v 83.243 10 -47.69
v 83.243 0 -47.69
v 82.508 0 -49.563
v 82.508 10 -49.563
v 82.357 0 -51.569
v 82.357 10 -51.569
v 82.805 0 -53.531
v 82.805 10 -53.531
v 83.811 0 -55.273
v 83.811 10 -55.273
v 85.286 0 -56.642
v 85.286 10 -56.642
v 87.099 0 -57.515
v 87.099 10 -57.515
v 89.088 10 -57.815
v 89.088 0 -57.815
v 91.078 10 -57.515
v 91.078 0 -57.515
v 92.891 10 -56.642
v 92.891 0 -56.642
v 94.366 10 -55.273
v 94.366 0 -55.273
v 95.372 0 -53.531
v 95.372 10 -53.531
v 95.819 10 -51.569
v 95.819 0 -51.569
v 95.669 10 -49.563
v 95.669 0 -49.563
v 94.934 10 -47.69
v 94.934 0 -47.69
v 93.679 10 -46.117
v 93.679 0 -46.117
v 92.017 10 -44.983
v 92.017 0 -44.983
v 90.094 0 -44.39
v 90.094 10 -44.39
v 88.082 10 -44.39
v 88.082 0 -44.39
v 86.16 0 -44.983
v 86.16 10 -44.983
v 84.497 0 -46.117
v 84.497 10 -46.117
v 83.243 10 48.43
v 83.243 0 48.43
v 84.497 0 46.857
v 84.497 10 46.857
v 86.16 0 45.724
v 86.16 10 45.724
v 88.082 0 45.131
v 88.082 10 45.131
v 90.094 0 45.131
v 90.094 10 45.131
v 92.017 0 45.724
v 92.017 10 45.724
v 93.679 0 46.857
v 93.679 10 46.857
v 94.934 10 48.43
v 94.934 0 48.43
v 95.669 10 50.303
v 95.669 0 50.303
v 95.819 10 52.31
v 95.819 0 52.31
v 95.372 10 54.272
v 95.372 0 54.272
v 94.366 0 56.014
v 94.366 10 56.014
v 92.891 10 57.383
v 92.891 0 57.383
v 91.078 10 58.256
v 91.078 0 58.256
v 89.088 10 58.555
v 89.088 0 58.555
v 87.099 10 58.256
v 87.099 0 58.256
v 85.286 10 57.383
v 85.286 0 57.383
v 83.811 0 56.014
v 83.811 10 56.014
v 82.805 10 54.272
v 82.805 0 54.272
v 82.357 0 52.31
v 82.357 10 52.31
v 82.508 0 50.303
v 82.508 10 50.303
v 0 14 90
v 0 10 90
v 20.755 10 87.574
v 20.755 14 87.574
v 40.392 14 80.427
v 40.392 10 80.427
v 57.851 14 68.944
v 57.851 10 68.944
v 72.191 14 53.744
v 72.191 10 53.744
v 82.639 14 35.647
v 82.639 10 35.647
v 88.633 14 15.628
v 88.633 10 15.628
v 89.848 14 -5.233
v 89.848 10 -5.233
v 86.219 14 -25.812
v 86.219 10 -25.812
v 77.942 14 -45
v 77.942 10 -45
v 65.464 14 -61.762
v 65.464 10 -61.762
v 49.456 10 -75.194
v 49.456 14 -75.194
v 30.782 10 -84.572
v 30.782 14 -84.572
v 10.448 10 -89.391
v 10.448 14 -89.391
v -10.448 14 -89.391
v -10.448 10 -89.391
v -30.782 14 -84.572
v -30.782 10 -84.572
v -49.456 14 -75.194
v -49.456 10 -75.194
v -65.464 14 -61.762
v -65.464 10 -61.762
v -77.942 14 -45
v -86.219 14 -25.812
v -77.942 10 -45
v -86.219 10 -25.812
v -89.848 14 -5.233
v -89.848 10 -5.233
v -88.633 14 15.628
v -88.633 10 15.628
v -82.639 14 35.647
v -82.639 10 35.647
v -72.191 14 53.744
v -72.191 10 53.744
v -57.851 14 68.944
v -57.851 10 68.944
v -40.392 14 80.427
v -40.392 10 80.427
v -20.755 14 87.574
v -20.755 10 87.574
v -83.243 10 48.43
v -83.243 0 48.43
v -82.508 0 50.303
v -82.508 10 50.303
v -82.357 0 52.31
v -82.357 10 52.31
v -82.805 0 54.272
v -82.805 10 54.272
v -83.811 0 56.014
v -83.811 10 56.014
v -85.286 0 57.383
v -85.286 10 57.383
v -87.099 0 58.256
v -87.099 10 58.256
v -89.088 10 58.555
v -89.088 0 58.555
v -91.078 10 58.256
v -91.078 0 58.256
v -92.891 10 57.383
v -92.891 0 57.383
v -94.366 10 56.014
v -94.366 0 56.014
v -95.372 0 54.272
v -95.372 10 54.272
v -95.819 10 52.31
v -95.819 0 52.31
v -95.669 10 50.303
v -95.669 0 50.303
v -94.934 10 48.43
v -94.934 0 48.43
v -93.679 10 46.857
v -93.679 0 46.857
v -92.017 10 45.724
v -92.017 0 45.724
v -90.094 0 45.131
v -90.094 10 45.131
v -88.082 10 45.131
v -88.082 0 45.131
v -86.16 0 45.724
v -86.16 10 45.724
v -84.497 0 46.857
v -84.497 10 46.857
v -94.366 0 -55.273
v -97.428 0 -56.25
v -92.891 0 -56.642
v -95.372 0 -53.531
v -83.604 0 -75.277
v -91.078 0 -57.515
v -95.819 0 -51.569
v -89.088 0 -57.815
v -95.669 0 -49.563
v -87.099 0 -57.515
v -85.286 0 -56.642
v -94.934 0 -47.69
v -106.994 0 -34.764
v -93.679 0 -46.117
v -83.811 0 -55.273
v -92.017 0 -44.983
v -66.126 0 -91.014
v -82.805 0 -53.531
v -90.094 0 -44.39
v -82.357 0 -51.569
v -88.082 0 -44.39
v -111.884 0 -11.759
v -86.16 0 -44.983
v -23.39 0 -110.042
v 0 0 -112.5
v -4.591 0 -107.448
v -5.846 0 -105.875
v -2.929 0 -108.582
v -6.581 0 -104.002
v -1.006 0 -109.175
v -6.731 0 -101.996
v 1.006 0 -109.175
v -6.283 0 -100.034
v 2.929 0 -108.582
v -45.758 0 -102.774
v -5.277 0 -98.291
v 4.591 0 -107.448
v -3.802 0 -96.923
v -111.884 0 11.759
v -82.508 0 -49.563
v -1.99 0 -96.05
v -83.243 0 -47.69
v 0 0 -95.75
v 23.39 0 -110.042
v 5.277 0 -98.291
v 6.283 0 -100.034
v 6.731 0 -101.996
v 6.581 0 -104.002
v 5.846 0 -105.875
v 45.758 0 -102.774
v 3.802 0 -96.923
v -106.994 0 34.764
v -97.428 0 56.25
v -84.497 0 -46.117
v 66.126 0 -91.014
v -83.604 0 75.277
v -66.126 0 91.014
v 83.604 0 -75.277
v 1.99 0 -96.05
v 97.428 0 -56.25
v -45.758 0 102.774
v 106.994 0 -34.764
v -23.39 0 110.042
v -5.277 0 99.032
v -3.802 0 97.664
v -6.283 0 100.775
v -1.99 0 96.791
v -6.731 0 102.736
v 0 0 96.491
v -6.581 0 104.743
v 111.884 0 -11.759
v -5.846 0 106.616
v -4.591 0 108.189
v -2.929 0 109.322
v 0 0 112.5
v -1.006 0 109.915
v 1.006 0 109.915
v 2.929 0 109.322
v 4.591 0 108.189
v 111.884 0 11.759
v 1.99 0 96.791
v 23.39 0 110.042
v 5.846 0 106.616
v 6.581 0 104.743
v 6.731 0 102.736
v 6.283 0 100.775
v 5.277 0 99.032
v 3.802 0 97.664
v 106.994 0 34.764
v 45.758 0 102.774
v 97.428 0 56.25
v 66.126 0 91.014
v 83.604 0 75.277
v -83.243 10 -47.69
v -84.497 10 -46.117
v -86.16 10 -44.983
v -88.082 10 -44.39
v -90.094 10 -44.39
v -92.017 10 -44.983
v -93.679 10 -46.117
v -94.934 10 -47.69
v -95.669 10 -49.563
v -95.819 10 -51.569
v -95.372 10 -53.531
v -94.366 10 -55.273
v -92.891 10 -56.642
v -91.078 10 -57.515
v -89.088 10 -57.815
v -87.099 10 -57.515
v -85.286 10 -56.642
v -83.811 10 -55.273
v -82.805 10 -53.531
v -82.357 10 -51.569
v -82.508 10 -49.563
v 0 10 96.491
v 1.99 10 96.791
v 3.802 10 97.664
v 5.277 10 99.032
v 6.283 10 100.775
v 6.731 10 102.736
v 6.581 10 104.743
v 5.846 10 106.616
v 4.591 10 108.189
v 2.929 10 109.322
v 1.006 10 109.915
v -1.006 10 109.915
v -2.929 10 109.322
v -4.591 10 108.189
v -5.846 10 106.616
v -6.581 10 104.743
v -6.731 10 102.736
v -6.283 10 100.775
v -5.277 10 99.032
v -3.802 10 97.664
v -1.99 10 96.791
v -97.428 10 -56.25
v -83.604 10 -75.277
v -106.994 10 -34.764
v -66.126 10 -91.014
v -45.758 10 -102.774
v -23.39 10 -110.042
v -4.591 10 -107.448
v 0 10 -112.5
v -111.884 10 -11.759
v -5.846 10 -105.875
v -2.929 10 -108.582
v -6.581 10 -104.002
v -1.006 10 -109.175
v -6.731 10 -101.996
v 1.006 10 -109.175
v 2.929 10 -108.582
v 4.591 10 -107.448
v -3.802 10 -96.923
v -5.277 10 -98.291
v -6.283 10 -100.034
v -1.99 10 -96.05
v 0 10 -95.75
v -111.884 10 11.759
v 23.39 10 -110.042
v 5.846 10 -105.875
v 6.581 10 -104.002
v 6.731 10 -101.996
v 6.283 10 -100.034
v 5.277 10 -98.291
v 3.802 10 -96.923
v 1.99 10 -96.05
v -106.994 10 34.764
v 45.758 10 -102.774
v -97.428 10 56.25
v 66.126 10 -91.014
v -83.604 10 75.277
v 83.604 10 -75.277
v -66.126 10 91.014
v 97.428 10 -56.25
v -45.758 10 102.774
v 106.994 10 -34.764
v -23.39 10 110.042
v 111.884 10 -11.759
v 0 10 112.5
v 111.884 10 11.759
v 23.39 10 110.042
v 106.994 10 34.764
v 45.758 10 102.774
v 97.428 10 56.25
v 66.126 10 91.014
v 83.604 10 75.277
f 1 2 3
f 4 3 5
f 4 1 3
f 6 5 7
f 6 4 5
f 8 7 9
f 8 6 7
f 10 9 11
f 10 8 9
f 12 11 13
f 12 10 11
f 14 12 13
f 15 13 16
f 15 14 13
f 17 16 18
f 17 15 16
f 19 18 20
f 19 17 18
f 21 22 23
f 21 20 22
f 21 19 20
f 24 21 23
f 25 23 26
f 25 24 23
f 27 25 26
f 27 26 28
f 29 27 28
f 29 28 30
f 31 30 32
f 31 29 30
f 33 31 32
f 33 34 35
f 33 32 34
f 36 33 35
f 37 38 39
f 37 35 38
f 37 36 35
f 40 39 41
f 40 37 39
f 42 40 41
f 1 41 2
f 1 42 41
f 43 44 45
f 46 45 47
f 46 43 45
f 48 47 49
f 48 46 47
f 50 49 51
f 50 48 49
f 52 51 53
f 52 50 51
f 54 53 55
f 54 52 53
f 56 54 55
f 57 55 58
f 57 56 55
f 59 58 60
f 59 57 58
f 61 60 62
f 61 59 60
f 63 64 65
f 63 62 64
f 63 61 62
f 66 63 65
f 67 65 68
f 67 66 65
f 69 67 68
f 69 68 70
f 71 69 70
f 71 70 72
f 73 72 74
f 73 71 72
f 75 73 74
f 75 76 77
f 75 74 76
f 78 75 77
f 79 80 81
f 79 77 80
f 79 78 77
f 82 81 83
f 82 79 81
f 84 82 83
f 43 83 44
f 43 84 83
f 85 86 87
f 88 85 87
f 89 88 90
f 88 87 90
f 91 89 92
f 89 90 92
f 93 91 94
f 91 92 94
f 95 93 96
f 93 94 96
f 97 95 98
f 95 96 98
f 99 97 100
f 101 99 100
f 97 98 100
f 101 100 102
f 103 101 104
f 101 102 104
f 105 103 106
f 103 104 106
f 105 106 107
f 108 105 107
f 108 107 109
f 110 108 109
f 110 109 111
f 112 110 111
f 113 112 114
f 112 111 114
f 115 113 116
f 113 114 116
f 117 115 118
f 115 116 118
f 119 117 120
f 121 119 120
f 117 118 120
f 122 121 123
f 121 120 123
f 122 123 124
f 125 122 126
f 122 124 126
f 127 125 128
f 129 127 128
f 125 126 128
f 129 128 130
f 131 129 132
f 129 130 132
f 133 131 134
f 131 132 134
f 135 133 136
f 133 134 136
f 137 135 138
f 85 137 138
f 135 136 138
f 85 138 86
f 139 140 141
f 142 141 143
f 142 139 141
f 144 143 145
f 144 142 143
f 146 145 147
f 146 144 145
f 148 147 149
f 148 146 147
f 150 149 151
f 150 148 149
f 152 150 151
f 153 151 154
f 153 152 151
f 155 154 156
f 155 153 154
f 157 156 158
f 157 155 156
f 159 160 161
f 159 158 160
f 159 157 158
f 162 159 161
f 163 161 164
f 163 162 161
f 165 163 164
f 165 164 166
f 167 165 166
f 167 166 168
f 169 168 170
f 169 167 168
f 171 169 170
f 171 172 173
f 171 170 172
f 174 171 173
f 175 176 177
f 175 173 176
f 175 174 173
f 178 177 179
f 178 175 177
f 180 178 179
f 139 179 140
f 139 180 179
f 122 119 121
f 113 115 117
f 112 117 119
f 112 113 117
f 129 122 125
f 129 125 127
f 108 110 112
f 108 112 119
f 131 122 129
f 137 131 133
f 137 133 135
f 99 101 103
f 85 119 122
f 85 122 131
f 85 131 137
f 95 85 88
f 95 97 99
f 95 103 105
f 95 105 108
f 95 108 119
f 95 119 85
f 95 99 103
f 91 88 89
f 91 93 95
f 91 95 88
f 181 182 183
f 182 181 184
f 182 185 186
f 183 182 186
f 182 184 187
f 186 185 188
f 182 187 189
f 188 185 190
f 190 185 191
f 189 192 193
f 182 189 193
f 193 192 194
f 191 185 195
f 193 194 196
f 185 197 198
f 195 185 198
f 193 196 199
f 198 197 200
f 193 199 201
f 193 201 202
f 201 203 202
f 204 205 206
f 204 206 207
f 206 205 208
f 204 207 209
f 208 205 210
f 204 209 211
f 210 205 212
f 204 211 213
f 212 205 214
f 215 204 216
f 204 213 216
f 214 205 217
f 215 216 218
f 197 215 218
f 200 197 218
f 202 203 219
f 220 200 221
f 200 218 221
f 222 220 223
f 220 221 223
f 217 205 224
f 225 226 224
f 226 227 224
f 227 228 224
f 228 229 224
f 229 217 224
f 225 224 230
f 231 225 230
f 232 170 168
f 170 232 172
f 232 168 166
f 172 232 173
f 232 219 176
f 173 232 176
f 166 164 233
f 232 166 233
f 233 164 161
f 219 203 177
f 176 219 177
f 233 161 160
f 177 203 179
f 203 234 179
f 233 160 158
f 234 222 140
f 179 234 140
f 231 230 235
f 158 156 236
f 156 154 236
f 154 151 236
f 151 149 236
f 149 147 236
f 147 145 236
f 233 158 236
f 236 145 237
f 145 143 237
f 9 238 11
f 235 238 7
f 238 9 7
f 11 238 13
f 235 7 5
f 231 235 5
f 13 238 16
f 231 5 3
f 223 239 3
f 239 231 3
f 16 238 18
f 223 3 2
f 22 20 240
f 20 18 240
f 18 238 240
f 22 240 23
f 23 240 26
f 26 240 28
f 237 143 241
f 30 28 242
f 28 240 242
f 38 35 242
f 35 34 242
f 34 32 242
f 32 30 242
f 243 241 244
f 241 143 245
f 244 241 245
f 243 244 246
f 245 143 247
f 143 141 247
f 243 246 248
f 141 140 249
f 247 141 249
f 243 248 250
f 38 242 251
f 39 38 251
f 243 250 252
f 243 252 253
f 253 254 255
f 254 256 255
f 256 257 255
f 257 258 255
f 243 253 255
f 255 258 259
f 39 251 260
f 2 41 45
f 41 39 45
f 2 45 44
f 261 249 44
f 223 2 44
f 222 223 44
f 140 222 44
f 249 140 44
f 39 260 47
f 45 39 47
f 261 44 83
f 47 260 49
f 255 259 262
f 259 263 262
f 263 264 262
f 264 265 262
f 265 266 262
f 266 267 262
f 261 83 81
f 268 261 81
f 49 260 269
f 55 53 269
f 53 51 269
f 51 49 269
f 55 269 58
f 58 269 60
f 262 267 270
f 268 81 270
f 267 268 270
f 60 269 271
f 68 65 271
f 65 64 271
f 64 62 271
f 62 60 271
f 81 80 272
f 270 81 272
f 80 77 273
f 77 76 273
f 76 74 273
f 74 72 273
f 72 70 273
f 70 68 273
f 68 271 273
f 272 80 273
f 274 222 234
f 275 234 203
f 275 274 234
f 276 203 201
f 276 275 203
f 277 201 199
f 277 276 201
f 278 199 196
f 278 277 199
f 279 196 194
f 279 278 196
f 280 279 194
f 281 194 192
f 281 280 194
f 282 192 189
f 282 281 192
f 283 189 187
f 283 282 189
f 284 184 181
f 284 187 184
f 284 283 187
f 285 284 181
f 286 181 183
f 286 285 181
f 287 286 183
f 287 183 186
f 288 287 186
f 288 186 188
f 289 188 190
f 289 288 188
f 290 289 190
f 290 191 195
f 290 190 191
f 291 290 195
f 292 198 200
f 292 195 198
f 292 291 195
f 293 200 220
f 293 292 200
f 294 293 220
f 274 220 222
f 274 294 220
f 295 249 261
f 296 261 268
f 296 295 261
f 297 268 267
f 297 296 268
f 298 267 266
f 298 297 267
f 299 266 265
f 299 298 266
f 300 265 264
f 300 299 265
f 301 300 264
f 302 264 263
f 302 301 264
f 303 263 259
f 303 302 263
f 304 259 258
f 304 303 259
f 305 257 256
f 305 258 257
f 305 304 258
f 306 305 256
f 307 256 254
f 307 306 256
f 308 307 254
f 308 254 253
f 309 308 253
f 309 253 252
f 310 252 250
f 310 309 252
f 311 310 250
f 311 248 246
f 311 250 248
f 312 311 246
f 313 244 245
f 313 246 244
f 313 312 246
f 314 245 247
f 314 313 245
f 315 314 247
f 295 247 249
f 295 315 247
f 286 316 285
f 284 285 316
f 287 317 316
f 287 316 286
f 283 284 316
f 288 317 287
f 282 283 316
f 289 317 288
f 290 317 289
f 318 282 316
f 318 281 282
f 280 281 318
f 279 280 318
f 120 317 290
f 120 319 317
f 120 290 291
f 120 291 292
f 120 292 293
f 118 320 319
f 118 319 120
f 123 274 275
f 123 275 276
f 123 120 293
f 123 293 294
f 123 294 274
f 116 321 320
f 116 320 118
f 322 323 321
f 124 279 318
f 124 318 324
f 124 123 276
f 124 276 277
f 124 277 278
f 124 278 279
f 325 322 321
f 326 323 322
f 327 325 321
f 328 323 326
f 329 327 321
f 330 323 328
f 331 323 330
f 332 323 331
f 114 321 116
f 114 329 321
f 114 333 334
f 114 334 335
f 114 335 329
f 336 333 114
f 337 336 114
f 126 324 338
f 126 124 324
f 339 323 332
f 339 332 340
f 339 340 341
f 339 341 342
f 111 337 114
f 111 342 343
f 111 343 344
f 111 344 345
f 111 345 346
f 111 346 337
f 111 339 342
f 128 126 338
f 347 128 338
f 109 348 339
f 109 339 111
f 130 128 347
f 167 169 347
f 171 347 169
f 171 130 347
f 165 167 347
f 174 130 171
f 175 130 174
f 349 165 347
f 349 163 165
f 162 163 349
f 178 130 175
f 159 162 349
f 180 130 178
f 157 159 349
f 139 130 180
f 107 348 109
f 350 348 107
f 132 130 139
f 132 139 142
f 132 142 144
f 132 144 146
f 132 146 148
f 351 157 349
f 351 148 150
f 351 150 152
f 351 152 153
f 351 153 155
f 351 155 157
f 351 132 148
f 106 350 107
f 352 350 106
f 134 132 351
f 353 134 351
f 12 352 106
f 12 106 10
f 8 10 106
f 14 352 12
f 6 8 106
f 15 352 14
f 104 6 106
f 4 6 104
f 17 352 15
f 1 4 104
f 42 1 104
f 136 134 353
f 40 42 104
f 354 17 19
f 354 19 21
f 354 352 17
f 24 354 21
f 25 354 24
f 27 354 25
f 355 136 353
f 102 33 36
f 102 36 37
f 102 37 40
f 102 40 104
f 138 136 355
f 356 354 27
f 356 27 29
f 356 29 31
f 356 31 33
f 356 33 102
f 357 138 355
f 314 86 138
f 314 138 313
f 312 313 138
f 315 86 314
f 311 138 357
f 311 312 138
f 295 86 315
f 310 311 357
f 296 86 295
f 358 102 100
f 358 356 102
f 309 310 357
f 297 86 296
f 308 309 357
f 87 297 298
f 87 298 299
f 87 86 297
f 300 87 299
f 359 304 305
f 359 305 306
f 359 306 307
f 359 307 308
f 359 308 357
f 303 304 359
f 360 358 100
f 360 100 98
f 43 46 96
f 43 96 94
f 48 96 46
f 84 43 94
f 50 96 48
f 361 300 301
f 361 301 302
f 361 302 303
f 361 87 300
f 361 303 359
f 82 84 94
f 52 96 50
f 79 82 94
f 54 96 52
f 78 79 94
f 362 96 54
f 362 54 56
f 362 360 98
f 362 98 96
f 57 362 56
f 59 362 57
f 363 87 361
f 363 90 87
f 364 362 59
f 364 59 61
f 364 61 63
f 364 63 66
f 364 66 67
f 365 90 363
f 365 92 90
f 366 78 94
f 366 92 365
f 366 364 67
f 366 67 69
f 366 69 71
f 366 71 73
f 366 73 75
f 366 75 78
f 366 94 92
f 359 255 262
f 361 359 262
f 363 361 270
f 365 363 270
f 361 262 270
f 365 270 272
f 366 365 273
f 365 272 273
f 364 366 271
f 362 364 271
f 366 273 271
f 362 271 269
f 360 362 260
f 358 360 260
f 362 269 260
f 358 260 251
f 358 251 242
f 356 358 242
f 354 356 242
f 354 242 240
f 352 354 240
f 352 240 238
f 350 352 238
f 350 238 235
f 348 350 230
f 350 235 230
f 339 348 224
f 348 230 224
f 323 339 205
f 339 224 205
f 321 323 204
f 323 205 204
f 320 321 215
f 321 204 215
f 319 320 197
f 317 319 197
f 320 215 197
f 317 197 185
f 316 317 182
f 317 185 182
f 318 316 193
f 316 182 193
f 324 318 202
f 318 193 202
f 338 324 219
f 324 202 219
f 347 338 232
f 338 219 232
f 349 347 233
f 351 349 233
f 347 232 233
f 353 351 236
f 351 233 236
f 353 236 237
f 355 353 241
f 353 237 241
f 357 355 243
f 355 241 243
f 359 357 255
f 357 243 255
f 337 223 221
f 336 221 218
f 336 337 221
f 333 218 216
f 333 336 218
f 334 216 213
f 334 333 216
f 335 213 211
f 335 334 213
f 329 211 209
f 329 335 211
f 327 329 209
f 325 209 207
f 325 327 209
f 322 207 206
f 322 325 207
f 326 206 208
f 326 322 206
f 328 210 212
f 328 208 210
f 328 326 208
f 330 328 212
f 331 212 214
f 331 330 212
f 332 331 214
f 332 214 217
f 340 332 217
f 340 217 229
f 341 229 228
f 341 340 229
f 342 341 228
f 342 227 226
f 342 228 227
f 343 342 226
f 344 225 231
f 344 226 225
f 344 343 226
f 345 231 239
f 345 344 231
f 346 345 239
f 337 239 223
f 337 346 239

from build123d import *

# Parameters (mm, degrees)
CROQUIS1_R              = 112.5
SALIENTE_EXTRUIR1_DEPTH = 10
MATRIZC1_COUNT          = 6
CROQUIS6_R              = 90
SALIENTE_EXTRUIR2_DEPTH = 4


with BuildPart() as part:
    # Croquis1 → Saliente-Extruir1 (new body)
    with BuildSketch(Plane(origin=(0, 0, 0), x_dir=(1, 0, 0), z_dir=(0, 1, 0))):
        with Locations(Location((0, 0, 0), (0, 0, 270))):
            Circle(CROQUIS1_R)
    extrude(amount=SALIENTE_EXTRUIR1_DEPTH)

    # Croquis5 → Taladro de margen para M121 (revolve, cut)
    with BuildSketch(Plane(origin=(0, 10, -102.5), x_dir=(0, 0, 1), z_dir=(1, 0, 0))):
        Polygon((0, 0), (0, 47.555809178), (6.75, 43.5), (6.75, 0), align=None)
    taladro_de_margen_para_m121 = revolve(axis=Axis((0, 16.35, -102.5), (0, -1, 0)), mode=Mode.SUBTRACT)

    # MatrizC1: Taladro de margen para M121 ×6 about axis
    matrizc1_axis = Axis((0, 0, 0.3703332), (0, 1, 0))
    for i in range(1, MATRIZC1_COUNT):
        add(taladro_de_margen_para_m121.rotate(matrizc1_axis, i * 360 / MATRIZC1_COUNT), mode=Mode.SUBTRACT)

    # Croquis6 → Saliente-Extruir2 (add)
    with BuildSketch(Plane(origin=(0, 10, 0), x_dir=(1, 0, 0), z_dir=(0, 1, 0))):
        with Locations(Location((0, 0, 0), (0, 0, 270))):
            Circle(CROQUIS6_R)
    extrude(amount=SALIENTE_EXTRUIR2_DEPTH)


solid = part.part
